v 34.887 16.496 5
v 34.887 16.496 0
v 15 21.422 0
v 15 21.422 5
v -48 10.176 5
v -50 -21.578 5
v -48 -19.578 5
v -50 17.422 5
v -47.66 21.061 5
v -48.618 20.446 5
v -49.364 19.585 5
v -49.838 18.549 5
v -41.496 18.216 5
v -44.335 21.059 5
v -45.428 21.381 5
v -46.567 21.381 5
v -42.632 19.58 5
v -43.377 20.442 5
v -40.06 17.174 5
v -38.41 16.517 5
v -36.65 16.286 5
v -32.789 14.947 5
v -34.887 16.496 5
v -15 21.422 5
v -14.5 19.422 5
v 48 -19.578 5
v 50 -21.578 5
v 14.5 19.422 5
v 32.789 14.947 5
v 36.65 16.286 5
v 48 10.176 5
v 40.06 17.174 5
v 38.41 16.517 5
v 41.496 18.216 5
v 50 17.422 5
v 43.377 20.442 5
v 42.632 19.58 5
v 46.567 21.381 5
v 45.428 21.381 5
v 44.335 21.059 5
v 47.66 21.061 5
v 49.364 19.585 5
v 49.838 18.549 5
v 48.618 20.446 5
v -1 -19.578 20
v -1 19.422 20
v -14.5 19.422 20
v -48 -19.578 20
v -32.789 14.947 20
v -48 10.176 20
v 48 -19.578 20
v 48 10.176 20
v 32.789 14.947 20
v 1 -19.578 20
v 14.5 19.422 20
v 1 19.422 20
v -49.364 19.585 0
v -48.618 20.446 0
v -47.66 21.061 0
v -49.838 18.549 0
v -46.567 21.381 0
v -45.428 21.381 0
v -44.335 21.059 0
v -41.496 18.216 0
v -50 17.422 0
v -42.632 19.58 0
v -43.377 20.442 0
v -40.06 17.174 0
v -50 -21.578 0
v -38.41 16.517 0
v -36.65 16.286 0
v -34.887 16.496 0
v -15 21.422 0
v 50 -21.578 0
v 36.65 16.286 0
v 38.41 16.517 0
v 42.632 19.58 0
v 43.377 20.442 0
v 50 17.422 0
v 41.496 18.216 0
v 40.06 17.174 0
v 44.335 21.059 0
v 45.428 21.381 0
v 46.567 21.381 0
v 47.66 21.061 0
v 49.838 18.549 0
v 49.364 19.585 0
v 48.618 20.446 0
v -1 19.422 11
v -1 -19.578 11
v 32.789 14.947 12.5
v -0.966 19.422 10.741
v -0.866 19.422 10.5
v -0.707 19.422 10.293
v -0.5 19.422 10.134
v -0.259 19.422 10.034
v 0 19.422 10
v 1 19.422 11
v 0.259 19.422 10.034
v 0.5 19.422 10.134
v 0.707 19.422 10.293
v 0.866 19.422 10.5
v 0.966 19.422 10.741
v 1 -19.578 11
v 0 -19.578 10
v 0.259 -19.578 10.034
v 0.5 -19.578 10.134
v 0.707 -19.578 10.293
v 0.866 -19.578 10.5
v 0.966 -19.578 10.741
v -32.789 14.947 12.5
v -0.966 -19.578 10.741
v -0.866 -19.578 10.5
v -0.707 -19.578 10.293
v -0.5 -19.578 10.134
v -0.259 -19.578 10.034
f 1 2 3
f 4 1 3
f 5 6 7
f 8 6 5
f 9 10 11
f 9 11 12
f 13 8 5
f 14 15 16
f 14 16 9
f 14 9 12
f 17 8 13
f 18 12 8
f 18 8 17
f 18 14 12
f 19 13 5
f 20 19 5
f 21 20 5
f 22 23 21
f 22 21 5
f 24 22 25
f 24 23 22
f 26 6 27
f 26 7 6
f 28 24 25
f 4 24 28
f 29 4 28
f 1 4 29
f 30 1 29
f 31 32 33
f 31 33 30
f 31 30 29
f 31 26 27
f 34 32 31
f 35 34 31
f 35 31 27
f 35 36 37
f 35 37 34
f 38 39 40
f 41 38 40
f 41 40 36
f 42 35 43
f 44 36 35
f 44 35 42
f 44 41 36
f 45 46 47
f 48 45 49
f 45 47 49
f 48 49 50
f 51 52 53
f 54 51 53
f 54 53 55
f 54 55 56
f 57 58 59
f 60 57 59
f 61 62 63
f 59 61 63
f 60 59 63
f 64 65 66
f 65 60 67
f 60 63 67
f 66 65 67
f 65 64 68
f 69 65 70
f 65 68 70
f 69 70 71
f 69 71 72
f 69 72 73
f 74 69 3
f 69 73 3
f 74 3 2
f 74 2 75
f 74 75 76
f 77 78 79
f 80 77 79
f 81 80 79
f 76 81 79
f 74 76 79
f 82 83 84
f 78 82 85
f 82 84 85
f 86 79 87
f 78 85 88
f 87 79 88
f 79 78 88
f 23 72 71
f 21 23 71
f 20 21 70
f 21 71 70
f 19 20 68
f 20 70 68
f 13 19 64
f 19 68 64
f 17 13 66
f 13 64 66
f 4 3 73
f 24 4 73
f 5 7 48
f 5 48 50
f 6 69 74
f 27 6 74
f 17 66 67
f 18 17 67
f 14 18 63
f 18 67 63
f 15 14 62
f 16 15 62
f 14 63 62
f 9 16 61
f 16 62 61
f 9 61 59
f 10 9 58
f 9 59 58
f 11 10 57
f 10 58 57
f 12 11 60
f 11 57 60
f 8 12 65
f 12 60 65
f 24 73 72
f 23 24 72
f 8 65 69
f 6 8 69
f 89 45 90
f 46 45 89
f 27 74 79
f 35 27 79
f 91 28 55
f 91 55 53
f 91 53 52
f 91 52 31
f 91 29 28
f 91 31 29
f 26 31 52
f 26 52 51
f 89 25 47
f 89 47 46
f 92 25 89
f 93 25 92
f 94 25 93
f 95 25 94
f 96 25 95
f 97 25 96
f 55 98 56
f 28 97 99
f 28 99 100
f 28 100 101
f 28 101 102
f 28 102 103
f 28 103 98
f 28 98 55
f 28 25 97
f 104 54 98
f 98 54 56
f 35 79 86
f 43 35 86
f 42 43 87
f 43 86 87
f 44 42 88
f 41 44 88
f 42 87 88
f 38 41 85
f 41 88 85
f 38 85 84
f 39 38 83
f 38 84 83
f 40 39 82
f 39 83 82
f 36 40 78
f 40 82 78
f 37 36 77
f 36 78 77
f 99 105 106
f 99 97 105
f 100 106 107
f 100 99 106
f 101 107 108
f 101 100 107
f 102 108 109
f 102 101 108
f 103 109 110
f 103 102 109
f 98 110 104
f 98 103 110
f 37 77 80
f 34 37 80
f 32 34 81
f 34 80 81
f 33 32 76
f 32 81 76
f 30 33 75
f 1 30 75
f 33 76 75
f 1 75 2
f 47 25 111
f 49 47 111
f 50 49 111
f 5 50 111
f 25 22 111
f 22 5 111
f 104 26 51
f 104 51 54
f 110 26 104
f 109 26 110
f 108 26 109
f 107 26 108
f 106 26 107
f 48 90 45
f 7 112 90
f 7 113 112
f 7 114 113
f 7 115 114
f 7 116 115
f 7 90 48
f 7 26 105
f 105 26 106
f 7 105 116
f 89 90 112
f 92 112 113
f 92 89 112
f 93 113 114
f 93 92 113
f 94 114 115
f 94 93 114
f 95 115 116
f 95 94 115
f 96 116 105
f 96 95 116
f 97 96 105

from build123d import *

# Parameters (mm, degrees)
BOSS_EXTRUDE5_DEPTH = 15
BOSS_EXTRUDE6_DEPTH = 5
SKETCH3_W           = 2
SKETCH3_H           = 39.156418696
CUT_EXTRUDE1_DEPTH  = 10
FILLET2_R           = 1


with BuildPart() as part:
    # Sketch2 → Boss-Extrude5 (new body)
    with BuildSketch(Plane.XY.offset(5)):
        with BuildLine():
            Line((-14.5, 19.421790652), (14.5, 19.421790652))
            add(Edge.make_bspline(
                [(14.5, 19.421790652), (34.327554894, 15.095349213), (48, 10.176108588)],
                knots=[0, 0, 0, 1, 1, 1], degree=2))
            Line((48, 10.176108588), (48, -19.578209348))
            Line((48, -19.578209348), (-48, -19.578209348))
            Line((-48, -19.578209348), (-48, 10.176108588))
            add(Edge.make_bspline(
                [(-14.5, 19.421790652), (-34.327554894, 15.095349213), (-48, 10.176108588)],
                knots=[0, 0, 0, 1, 1, 1], degree=2))
        make_face()
    extrude(amount=BOSS_EXTRUDE5_DEPTH)

    # Sketch1 → Boss-Extrude6 (add)
    # profile 1 of 2: a face of its own
    with BuildSketch(Plane.XY):
        with BuildLine():
            Line((-15, 21.421790652), (-34.887462632, 16.495927254))
            ThreePointArc((-34.887462632, 16.495927254), (-39.255473059, 16.793838072), (-42.632407856, 19.580337189))
            ThreePointArc((-42.632407856, 19.580337189), (-47.124640259, 21.2604342), (-50, 17.421790652))
            Line((-50, 17.421790652), (-50, -21.578209348))
            Line((-50, -21.578209348), (50, -21.578209348))
            Line((50, -21.578209348), (50, 17.421790652))
            ThreePointArc((50, 17.421790652), (47.124640259, 21.2604342), (42.632407856, 19.580337189))
            ThreePointArc((42.632407856, 19.580337189), (39.255473059, 16.793838072), (34.887462632, 16.495927254))
            Line((34.887462632, 16.495927254), (15, 21.421790652))
            Line((15, 21.421790652), (-15, 21.421790652))
        make_face()
        with BuildLine():
            add(Edge.make_bspline(
                [(-14.5, 19.421790652), (-34.327554894, 15.095349213), (-48, 10.176108588)],
                knots=[0, 0, 0, 1, 1, 1], degree=2))
            Line((-48, 10.176108588), (-48, -19.578209348))
            Line((-48, -19.578209348), (48, -19.578209348))
            Line((48, -19.578209348), (48, 10.176108588))
            add(Edge.make_bspline(
                [(14.5, 19.421790652), (34.327554894, 15.095349213), (48, 10.176108588)],
                knots=[0, 0, 0, 1, 1, 1], degree=2))
            Line((14.5, 19.421790652), (-14.5, 19.421790652))
        make_face(mode=Mode.SUBTRACT)
    # profile 2 of 2: a face of its own
    with BuildSketch(Plane.XY):
        with BuildLine():
            Line((-14.5, 19.421790652), (14.5, 19.421790652))
            add(Edge.make_bspline(
                [(14.5, 19.421790652), (34.327554894, 15.095349213), (48, 10.176108588)],
                knots=[0, 0, 0, 1, 1, 1], degree=2))
            Line((48, 10.176108588), (48, -19.578209348))
            Line((48, -19.578209348), (-48, -19.578209348))
            Line((-48, -19.578209348), (-48, 10.176108588))
            add(Edge.make_bspline(
                [(-14.5, 19.421790652), (-34.327554894, 15.095349213), (-48, 10.176108588)],
                knots=[0, 0, 0, 1, 1, 1], degree=2))
        make_face()
    extrude(amount=BOSS_EXTRUDE6_DEPTH)

    # Sketch3 → Cut-Extrude1 (cut)
    with BuildSketch(Plane.XY.offset(20)):
        Rectangle(SKETCH3_W, SKETCH3_H)
    extrude(amount=-CUT_EXTRUDE1_DEPTH, mode=Mode.SUBTRACT)

    # Fillet2
    fillet2_edges = [part.edges().sort_by_distance(p)[0] for p in [
        (1, -0.078209348, 10),
        (-1, -0.078209348, 10),
    ]]
    fillet(fillet2_edges, radius=FILLET2_R - 0.0001)  # a hair under: the kernel refuses the full size


solid = part.part
